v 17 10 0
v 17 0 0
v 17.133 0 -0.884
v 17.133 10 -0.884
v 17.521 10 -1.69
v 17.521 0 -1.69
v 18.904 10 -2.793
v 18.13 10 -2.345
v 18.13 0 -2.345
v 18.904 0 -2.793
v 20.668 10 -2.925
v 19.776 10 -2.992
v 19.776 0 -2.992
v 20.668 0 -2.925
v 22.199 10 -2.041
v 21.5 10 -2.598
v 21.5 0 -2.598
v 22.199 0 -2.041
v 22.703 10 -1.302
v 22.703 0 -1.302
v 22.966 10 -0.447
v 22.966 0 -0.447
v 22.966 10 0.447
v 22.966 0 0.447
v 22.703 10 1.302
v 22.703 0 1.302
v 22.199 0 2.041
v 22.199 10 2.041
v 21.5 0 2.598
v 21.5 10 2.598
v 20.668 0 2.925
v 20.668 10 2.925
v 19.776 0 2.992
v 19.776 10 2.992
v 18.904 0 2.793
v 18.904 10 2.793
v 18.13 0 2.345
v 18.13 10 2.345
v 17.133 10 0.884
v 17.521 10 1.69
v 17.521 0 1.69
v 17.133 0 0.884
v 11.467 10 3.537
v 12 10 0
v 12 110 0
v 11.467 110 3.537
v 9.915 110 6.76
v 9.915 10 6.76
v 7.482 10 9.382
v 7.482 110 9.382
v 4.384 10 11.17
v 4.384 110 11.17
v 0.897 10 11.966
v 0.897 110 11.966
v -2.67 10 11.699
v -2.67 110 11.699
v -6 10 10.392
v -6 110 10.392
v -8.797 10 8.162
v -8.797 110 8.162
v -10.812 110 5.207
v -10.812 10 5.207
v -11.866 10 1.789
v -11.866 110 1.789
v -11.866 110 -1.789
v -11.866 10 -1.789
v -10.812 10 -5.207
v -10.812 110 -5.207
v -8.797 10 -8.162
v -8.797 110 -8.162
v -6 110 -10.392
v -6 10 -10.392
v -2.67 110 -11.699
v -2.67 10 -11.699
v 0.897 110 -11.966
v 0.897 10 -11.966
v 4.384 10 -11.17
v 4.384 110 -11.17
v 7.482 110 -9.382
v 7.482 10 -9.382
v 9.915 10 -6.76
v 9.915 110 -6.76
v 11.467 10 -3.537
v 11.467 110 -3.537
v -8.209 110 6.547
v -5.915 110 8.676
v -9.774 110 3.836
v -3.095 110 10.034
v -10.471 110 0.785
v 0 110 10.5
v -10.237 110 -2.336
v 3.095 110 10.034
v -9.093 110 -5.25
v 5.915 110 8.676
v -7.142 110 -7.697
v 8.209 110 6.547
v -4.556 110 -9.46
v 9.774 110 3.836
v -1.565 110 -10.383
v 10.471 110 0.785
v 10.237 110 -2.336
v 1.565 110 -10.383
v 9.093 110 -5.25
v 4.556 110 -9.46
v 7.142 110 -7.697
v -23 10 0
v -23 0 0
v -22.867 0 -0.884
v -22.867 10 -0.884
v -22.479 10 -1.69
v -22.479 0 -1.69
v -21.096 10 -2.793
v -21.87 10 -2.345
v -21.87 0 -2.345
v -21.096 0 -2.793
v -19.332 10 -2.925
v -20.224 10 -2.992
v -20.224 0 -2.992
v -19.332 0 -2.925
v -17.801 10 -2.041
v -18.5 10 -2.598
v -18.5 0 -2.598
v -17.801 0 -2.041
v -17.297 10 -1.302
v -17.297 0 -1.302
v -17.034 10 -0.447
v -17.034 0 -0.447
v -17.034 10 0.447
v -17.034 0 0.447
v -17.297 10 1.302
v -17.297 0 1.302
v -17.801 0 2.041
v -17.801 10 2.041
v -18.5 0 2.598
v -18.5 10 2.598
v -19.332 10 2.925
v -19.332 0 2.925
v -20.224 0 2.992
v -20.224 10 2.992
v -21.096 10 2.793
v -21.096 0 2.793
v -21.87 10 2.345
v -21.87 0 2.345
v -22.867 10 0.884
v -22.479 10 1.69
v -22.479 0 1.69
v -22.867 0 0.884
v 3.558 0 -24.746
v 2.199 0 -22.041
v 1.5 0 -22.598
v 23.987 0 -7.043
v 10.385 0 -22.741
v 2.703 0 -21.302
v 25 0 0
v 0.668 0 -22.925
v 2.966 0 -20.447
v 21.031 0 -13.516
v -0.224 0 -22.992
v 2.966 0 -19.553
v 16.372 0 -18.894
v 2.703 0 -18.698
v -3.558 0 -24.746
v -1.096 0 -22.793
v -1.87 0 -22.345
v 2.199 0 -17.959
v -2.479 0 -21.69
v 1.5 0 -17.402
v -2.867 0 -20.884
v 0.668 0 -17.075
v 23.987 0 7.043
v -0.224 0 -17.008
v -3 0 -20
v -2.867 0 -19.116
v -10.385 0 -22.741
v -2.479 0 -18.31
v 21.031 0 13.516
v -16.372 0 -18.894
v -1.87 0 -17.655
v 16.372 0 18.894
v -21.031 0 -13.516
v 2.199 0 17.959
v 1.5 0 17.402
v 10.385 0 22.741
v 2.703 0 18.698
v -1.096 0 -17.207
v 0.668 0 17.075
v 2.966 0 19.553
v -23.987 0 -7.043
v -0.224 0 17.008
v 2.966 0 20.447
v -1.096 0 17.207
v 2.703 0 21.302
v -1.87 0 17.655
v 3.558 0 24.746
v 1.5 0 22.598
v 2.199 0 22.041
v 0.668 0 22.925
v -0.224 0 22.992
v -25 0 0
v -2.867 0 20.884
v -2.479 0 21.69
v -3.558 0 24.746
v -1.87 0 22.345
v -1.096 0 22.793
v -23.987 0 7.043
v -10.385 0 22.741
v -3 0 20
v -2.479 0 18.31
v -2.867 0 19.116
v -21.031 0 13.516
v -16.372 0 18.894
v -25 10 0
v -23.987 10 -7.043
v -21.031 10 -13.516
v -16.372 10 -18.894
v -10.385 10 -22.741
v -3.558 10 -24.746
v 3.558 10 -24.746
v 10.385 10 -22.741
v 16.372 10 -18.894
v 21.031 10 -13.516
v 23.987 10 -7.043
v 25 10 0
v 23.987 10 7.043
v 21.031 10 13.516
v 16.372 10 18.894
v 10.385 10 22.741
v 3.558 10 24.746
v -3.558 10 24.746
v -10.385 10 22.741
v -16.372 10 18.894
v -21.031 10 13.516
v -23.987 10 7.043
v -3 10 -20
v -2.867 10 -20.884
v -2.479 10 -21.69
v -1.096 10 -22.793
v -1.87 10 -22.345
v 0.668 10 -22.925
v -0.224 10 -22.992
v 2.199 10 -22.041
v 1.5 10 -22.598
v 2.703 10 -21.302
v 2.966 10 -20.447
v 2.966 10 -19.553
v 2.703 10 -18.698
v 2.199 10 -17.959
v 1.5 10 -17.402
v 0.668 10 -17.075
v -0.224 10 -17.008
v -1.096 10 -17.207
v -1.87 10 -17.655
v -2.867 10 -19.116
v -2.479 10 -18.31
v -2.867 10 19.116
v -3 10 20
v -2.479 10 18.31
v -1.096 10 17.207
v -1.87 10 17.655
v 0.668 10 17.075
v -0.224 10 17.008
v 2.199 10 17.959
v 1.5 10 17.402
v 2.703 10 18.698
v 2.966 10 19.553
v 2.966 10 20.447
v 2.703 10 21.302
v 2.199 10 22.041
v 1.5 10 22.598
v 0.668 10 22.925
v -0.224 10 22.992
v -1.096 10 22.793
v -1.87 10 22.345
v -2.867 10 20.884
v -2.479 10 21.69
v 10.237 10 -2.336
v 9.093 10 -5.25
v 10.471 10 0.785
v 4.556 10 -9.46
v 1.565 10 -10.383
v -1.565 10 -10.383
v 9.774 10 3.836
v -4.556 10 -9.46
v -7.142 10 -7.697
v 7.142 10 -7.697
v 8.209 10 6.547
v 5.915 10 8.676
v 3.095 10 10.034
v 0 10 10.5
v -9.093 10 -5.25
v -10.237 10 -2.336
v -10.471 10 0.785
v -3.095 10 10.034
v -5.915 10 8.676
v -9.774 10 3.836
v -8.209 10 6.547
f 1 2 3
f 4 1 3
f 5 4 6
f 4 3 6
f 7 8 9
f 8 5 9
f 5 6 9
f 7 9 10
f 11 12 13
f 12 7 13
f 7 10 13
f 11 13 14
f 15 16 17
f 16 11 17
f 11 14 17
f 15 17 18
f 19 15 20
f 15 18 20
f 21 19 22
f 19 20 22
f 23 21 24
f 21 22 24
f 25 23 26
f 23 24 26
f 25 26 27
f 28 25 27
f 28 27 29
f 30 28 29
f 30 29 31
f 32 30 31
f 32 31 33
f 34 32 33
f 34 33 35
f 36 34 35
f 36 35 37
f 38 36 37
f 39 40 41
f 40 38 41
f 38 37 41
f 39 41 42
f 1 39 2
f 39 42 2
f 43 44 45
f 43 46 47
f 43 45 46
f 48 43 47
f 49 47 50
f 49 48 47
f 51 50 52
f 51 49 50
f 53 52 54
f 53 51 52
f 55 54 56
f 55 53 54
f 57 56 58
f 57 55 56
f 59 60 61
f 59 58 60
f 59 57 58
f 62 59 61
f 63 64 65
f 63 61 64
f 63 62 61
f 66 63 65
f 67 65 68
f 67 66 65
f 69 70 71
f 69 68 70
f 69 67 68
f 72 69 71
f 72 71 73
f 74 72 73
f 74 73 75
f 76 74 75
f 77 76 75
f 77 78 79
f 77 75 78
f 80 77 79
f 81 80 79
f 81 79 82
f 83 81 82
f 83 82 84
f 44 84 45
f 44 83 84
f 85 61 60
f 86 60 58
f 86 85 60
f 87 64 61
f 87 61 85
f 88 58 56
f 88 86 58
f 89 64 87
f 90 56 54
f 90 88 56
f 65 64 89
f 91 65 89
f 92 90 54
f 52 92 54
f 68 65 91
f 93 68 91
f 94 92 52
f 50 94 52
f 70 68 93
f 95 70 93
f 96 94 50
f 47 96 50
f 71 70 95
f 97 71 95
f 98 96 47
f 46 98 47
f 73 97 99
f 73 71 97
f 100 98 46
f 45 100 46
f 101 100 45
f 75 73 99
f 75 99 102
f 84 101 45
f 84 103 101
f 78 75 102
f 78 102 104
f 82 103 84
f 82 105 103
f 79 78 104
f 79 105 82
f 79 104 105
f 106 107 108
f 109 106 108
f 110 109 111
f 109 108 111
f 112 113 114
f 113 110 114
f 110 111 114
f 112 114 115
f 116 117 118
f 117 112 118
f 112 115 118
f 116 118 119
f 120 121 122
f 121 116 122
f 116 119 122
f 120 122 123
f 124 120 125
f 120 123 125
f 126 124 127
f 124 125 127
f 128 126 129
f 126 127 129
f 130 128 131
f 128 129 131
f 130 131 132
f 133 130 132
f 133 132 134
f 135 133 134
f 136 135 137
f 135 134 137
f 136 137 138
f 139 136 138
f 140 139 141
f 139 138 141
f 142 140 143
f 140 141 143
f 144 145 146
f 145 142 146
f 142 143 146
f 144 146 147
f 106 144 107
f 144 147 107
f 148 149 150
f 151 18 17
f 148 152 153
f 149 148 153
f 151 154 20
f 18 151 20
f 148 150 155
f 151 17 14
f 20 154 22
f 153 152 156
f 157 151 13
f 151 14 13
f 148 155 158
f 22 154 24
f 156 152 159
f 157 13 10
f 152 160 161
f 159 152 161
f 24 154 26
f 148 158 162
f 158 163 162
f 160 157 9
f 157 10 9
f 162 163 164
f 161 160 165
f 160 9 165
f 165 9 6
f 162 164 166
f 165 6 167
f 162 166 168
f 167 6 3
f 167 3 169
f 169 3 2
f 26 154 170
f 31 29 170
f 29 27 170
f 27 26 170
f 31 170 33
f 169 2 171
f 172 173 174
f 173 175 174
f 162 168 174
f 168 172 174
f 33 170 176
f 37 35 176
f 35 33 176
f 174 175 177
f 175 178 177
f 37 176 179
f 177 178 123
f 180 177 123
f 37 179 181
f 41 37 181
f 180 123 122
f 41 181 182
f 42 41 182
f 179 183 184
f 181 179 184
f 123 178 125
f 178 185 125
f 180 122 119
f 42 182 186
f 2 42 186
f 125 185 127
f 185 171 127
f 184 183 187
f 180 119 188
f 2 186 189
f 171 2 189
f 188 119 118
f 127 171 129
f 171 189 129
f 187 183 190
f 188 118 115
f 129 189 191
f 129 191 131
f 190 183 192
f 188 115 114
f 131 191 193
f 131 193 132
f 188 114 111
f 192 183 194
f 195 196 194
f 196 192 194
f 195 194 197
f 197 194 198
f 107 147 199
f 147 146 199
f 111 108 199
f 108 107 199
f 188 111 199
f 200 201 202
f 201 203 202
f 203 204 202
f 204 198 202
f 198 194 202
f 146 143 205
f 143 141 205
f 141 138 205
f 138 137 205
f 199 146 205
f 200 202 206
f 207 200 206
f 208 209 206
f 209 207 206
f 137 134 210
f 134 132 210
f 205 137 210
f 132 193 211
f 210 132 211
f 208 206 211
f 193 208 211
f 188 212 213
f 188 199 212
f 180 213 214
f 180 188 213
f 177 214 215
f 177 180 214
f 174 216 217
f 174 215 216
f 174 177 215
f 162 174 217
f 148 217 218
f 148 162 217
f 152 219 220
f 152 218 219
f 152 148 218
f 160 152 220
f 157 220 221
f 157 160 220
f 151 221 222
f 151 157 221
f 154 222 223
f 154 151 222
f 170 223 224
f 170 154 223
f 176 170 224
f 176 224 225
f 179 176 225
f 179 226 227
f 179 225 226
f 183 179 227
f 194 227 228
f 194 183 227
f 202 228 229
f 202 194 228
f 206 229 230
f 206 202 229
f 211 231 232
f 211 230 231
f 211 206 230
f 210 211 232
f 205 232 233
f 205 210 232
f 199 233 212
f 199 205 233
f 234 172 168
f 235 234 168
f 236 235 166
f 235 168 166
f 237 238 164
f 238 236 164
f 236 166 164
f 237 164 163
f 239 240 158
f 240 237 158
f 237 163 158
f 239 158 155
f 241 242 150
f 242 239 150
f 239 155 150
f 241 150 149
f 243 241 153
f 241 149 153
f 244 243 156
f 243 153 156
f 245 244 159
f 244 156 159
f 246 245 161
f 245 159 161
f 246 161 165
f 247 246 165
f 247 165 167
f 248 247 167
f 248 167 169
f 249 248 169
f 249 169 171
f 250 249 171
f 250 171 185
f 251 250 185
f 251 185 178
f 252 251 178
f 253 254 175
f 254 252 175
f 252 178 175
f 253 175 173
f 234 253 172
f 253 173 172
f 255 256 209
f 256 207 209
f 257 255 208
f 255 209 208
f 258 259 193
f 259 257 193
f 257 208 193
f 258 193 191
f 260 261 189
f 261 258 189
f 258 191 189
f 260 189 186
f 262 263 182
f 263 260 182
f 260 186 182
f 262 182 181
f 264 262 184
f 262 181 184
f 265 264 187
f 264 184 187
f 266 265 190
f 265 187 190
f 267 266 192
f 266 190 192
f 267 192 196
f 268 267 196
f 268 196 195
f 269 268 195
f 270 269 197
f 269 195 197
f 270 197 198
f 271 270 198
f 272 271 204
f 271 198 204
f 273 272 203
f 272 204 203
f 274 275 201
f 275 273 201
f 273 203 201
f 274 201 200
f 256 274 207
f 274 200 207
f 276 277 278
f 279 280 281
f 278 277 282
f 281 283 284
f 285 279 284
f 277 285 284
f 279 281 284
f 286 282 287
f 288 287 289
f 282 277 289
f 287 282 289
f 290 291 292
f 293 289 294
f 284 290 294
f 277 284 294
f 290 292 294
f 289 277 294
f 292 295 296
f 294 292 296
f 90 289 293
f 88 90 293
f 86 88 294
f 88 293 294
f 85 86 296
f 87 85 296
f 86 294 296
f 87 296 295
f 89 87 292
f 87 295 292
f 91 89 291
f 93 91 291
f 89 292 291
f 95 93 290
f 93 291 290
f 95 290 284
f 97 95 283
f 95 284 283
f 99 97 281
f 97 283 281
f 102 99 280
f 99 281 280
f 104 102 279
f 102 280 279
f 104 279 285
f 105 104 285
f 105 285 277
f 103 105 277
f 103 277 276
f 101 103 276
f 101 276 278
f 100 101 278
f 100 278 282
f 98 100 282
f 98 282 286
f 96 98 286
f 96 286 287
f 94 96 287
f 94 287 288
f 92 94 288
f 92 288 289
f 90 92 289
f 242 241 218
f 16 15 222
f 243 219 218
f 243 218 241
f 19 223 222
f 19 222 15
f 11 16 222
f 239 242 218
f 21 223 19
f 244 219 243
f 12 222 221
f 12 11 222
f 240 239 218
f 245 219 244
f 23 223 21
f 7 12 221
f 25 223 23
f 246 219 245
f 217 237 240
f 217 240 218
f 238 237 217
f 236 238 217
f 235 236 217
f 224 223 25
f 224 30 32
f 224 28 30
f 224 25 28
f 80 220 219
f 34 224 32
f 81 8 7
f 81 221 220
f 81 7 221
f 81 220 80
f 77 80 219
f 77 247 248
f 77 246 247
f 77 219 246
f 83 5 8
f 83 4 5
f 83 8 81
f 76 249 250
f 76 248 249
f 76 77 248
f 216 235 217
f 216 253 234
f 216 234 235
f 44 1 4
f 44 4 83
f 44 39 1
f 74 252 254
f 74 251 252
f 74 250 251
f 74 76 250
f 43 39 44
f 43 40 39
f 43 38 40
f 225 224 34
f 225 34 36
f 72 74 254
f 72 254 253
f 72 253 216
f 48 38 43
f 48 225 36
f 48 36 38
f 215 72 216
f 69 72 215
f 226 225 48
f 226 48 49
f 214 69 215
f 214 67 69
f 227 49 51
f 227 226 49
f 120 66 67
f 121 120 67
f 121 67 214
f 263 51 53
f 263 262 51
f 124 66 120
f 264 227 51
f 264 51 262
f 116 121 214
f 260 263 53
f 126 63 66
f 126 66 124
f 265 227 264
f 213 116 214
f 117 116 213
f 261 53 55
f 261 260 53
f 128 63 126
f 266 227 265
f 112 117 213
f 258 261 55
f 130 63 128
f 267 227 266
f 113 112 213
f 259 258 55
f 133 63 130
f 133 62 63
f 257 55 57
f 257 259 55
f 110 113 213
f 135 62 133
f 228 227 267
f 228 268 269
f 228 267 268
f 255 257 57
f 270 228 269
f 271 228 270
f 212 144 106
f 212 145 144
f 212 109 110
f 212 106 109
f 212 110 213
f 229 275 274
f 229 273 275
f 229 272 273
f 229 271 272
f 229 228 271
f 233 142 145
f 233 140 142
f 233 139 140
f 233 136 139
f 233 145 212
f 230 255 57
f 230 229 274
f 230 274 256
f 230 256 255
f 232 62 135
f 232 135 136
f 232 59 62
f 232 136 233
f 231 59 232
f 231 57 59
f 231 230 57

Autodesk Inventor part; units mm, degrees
ref_plane "YZ Plane" through (0, 0, 0) normal (1, 0, 0) x (0, 1, 0)
ref_plane "XZ Plane" through (0, 0, 0) normal (0, 1, 0) x (-1, 0, 0)
ref_plane "XY Plane" through (0, 0, 0) normal (0, 0, 1) x (1, 0, 0)
sketch "Boceto1" plane through (0, 0, 0) normal (0, 1, 0) x (-1, 0, 0)
  circle A0 centre (0, 0) radius 25
  circle A1 centre (20, 0) radius 3
  circle A2 centre (0, 20) radius 3
  circle A3 centre (-20, 0) radius 3
  circle A4 centre (0, -20) radius 3
  dimension "d0" = 50
  dimension "d2" = 6
  dimension "d5" = 360
extrude "Extrusión1" add sketch "Boceto1" along normal blind 10
sketch "Boceto2" plane through (0, 10, 0) normal (0, 1, 0) x (1, 0, 0)
  circle A0 centre (0, 0) radius 12
  circle A1 centre (0, 0) radius 10.5
  dimension "d9" = 24
  dimension "d10" = 21
extrude "Extrusión2" add sketch "Boceto2" along normal blind 100 contours A0 | A1
sketch "Boceto3" plane through (0, 110, 0) normal (0, 1, 0) x (1, 0, 0)
  circle A0 centre (0, 0) radius 12 projected
hole "Agujero1" at (0, 110, 0) direction (0, -1, 0) diameter 21 depth 100
